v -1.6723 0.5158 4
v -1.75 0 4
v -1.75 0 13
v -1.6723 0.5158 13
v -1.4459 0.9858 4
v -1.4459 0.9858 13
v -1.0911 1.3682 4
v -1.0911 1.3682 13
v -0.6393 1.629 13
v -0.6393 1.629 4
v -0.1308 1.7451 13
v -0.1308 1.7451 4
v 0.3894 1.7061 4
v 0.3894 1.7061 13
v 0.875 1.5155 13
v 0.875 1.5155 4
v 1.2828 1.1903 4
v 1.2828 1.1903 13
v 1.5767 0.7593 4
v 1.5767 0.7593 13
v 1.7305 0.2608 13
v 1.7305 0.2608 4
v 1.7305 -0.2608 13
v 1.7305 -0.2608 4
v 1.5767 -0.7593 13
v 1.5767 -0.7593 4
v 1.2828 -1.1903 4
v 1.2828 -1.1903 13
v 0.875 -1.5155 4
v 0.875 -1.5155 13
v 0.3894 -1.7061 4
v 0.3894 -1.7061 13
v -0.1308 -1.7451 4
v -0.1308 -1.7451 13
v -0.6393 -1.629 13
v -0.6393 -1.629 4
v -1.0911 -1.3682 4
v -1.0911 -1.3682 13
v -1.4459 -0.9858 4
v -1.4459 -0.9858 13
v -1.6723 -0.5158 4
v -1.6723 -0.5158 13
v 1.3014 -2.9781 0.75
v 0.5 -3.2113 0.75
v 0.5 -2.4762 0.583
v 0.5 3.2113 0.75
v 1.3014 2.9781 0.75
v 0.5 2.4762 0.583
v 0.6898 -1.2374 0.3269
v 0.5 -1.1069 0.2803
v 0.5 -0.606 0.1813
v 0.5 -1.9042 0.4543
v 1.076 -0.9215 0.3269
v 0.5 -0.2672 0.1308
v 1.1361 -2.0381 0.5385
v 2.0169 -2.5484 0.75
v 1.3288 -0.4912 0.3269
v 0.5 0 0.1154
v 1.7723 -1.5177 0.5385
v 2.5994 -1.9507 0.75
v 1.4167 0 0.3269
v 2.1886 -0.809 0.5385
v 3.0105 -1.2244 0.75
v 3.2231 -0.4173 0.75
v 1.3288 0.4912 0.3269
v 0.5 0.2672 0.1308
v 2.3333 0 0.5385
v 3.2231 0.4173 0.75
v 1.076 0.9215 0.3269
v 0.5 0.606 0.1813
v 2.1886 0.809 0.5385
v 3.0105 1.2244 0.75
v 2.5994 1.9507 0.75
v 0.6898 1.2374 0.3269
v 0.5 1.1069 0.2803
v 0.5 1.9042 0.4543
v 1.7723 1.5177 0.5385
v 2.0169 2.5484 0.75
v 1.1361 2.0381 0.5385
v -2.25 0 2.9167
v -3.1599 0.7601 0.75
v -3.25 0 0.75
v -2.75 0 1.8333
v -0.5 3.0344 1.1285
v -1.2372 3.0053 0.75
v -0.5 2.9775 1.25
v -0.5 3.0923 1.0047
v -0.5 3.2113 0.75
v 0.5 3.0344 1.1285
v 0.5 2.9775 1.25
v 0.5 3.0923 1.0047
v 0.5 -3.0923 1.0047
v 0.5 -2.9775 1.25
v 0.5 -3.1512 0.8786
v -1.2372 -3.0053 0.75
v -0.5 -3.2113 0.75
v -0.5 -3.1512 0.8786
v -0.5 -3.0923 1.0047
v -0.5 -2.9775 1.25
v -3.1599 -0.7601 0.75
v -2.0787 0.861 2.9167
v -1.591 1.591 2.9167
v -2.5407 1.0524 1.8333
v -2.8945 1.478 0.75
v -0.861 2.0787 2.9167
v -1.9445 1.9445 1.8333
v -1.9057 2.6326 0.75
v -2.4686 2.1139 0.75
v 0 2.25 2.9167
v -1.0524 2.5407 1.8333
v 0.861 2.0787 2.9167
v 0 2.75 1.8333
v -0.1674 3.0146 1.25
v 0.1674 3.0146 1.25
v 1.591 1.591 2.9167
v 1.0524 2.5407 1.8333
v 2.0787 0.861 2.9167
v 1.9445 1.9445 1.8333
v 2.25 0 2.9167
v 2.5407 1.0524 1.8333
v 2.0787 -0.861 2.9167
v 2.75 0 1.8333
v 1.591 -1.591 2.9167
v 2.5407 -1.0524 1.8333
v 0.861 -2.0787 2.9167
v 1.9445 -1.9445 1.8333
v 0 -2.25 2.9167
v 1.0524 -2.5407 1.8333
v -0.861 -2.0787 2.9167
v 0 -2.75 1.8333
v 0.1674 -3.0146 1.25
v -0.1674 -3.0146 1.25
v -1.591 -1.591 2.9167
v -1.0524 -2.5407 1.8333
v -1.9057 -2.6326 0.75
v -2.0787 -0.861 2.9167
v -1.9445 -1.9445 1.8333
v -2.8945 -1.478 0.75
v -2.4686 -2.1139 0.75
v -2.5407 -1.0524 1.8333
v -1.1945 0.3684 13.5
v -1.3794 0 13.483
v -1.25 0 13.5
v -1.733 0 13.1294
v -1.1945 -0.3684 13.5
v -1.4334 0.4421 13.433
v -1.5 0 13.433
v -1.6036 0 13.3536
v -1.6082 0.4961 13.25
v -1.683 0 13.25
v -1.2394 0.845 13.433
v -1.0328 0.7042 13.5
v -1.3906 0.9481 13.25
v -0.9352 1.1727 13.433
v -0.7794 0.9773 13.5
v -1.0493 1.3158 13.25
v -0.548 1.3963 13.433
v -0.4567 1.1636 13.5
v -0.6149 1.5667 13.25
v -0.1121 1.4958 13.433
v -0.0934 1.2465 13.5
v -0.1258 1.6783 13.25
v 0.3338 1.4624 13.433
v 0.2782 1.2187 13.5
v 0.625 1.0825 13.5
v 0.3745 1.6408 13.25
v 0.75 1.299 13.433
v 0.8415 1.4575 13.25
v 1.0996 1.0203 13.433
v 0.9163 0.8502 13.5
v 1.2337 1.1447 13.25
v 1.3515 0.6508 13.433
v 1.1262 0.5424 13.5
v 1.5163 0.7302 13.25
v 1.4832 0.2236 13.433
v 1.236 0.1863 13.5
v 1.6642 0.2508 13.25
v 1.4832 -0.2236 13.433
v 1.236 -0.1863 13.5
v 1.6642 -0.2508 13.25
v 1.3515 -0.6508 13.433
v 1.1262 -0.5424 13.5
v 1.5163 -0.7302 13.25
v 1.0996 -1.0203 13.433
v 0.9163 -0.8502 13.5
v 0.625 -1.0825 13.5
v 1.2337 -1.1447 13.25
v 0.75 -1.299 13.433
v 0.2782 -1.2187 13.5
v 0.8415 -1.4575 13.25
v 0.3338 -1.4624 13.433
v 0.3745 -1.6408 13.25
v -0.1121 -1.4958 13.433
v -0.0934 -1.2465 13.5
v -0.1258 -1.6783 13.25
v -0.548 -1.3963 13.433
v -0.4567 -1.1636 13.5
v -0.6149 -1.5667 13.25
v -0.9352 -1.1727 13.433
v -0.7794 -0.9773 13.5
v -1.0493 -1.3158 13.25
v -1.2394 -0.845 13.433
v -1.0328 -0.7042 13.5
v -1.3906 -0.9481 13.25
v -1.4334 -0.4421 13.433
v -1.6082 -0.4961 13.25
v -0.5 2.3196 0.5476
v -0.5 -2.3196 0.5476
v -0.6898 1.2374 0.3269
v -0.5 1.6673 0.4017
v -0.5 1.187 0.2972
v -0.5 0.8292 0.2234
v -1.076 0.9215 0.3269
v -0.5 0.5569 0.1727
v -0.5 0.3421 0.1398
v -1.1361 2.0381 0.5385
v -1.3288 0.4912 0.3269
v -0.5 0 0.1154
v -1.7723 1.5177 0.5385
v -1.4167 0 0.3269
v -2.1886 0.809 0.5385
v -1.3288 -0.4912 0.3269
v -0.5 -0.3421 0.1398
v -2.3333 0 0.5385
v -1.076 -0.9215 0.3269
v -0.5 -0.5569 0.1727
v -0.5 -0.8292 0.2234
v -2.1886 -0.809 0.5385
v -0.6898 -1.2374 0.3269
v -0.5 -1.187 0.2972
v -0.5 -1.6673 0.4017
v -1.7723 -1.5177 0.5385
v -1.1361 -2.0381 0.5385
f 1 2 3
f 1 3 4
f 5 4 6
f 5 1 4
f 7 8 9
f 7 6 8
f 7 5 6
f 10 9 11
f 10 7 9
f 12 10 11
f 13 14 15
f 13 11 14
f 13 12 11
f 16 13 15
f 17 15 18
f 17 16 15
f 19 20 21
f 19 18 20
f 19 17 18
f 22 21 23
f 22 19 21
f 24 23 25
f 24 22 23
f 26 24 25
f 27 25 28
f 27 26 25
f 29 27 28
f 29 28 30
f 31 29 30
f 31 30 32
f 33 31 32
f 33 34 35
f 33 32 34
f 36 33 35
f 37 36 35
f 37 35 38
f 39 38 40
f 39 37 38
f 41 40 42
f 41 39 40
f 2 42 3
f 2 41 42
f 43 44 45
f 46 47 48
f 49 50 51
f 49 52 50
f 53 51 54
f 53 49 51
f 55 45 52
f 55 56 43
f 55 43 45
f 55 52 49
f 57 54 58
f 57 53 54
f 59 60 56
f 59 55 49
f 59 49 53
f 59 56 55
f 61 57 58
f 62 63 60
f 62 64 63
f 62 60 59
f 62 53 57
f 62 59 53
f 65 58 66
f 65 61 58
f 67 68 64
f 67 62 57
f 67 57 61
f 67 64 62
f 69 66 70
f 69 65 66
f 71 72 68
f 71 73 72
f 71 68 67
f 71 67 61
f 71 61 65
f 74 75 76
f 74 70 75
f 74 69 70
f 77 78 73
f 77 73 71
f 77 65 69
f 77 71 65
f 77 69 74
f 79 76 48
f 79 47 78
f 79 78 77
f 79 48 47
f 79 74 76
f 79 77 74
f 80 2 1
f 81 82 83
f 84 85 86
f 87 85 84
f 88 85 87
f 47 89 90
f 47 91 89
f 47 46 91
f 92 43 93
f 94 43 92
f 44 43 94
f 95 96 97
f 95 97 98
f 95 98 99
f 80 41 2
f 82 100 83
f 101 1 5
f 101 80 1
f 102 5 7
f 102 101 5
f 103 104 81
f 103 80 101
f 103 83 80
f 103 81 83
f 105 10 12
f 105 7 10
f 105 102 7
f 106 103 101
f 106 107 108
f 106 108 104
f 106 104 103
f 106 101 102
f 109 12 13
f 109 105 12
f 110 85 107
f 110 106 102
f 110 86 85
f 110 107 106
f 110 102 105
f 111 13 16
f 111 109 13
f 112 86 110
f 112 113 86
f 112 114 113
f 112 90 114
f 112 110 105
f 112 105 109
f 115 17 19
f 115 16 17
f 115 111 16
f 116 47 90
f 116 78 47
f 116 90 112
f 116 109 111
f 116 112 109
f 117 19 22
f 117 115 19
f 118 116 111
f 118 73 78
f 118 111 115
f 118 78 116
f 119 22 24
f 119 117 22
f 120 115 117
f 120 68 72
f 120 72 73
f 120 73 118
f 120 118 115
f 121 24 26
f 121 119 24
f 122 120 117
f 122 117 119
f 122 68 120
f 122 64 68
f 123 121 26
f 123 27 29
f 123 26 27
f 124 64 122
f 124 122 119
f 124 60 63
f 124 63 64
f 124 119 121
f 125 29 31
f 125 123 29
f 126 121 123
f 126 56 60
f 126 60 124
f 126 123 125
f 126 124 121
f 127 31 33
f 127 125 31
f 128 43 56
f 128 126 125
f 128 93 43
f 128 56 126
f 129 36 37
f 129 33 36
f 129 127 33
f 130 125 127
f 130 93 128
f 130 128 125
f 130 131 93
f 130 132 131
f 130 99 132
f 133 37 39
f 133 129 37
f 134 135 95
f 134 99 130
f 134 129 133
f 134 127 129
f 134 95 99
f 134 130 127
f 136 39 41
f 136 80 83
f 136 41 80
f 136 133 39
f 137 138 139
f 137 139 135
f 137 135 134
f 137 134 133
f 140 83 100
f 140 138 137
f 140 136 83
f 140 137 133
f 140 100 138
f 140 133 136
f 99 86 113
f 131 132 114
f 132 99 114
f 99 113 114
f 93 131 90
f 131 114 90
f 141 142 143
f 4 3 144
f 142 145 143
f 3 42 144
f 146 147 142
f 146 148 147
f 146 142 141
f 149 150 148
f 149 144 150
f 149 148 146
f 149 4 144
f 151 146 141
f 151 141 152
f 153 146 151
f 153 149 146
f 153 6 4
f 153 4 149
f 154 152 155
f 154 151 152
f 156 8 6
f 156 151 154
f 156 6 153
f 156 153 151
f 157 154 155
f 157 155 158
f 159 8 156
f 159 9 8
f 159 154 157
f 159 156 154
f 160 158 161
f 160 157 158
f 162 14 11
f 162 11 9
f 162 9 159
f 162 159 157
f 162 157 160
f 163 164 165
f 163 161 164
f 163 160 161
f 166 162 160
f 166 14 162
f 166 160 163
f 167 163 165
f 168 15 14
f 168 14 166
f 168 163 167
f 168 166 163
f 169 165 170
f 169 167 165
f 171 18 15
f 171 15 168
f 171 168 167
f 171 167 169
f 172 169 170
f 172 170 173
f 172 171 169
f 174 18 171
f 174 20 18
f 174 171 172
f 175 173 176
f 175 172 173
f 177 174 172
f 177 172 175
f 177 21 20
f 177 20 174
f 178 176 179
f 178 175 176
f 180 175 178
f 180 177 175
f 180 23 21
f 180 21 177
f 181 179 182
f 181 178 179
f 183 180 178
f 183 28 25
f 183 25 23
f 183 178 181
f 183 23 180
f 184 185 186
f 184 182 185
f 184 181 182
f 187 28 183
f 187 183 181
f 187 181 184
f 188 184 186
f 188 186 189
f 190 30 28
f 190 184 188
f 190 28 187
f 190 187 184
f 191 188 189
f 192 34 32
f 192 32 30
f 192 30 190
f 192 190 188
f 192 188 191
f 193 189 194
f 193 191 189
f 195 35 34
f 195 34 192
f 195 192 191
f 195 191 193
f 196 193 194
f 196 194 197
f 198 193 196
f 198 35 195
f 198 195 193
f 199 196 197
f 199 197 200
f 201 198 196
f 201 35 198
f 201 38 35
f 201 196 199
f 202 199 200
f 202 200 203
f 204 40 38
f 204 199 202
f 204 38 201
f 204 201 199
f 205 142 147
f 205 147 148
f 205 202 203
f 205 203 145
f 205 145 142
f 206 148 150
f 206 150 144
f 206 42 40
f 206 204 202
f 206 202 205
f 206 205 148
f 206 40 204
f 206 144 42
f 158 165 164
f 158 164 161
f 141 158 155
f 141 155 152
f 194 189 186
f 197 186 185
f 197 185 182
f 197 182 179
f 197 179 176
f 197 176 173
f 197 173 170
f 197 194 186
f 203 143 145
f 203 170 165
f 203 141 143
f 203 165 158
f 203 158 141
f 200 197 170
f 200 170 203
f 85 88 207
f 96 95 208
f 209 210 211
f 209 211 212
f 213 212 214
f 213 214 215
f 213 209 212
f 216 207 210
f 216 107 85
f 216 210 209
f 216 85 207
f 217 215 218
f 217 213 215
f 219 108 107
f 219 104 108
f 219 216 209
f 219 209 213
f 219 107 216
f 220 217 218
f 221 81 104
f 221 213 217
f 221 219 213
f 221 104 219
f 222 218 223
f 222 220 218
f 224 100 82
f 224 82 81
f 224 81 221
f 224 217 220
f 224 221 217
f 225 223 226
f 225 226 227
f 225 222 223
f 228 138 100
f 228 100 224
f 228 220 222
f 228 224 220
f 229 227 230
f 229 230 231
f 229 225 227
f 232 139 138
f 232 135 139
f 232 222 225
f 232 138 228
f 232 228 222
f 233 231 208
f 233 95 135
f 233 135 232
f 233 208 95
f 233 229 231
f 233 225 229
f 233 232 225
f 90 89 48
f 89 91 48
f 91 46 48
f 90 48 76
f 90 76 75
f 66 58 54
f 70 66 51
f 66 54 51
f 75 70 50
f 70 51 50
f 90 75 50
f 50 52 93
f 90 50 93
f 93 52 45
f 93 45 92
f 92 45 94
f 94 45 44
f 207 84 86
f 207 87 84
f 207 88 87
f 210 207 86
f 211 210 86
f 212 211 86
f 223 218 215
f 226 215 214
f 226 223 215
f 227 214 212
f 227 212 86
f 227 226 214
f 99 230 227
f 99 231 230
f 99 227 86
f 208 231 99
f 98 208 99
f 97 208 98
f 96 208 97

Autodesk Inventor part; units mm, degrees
ref_plane "YZ Plane" through (0, 0, 0) normal (1, 0, 0) x (0, 1, 0)
ref_plane "XZ Plane" through (0, 0, 0) normal (0, 1, 0) x (-1, 0, 0)
ref_plane "XY Plane" through (0, 0, 0) normal (0, 0, 1) x (1, 0, 0)
sketch "Sketch1" plane through (0, 0, 0) normal (0, 1, 0) x (-1, 0, 0)
  line L0 (0, 0) -> (0, 13.5)
  line L1 (0, 13.5) -> (1.75, 13.5)
  line L2 (1.75, 13.5) -> (1.75, 4)
  line L3 (0, 0) -> (3.25, 0.75)
  line L4 (1.75, 4) -> (3.25, 0.75)
  dimension "d0" = 13.5
  dimension "d1" = 1.75
  dimension "d2" = 3.25
  dimension "d4" = 0.75
  dimension "d5" = 9.5
revolve "Revolution1" add sketch "Sketch1" angle 360 about axis through (0, 0, 0) along (0, 0, 1)
ref_plane "Work Plane1" through (0, 0, 0) normal (0, 0, 1) x (1, 0, 0)
sketch "Sketch2" plane through (0, 0, 0) normal (0, 0, 1) x (1, 0, 0)
  line L0 (0.5, 3.2113) -> (0.5, -3.2113)
  line L1 (-0.5, 3.2113) -> (-0.5, -3.2113)
  circle A0 centre (0, 0) radius 3.25 projected
  dimension "d8" = 1
  dimension "d9" = 0.5
extrude "Extrusion1" cut sketch "Sketch2" along normal blind 1.25 contours L0 A0 L1
thread "Thread1" size "M3.5x0.6" class "6g" standard "ANSI Metric M Profile" full length
fillet "Fillet1" radius 0.5 1 edges at (1.75, 0, 13.5)
properties part number "Screw"
